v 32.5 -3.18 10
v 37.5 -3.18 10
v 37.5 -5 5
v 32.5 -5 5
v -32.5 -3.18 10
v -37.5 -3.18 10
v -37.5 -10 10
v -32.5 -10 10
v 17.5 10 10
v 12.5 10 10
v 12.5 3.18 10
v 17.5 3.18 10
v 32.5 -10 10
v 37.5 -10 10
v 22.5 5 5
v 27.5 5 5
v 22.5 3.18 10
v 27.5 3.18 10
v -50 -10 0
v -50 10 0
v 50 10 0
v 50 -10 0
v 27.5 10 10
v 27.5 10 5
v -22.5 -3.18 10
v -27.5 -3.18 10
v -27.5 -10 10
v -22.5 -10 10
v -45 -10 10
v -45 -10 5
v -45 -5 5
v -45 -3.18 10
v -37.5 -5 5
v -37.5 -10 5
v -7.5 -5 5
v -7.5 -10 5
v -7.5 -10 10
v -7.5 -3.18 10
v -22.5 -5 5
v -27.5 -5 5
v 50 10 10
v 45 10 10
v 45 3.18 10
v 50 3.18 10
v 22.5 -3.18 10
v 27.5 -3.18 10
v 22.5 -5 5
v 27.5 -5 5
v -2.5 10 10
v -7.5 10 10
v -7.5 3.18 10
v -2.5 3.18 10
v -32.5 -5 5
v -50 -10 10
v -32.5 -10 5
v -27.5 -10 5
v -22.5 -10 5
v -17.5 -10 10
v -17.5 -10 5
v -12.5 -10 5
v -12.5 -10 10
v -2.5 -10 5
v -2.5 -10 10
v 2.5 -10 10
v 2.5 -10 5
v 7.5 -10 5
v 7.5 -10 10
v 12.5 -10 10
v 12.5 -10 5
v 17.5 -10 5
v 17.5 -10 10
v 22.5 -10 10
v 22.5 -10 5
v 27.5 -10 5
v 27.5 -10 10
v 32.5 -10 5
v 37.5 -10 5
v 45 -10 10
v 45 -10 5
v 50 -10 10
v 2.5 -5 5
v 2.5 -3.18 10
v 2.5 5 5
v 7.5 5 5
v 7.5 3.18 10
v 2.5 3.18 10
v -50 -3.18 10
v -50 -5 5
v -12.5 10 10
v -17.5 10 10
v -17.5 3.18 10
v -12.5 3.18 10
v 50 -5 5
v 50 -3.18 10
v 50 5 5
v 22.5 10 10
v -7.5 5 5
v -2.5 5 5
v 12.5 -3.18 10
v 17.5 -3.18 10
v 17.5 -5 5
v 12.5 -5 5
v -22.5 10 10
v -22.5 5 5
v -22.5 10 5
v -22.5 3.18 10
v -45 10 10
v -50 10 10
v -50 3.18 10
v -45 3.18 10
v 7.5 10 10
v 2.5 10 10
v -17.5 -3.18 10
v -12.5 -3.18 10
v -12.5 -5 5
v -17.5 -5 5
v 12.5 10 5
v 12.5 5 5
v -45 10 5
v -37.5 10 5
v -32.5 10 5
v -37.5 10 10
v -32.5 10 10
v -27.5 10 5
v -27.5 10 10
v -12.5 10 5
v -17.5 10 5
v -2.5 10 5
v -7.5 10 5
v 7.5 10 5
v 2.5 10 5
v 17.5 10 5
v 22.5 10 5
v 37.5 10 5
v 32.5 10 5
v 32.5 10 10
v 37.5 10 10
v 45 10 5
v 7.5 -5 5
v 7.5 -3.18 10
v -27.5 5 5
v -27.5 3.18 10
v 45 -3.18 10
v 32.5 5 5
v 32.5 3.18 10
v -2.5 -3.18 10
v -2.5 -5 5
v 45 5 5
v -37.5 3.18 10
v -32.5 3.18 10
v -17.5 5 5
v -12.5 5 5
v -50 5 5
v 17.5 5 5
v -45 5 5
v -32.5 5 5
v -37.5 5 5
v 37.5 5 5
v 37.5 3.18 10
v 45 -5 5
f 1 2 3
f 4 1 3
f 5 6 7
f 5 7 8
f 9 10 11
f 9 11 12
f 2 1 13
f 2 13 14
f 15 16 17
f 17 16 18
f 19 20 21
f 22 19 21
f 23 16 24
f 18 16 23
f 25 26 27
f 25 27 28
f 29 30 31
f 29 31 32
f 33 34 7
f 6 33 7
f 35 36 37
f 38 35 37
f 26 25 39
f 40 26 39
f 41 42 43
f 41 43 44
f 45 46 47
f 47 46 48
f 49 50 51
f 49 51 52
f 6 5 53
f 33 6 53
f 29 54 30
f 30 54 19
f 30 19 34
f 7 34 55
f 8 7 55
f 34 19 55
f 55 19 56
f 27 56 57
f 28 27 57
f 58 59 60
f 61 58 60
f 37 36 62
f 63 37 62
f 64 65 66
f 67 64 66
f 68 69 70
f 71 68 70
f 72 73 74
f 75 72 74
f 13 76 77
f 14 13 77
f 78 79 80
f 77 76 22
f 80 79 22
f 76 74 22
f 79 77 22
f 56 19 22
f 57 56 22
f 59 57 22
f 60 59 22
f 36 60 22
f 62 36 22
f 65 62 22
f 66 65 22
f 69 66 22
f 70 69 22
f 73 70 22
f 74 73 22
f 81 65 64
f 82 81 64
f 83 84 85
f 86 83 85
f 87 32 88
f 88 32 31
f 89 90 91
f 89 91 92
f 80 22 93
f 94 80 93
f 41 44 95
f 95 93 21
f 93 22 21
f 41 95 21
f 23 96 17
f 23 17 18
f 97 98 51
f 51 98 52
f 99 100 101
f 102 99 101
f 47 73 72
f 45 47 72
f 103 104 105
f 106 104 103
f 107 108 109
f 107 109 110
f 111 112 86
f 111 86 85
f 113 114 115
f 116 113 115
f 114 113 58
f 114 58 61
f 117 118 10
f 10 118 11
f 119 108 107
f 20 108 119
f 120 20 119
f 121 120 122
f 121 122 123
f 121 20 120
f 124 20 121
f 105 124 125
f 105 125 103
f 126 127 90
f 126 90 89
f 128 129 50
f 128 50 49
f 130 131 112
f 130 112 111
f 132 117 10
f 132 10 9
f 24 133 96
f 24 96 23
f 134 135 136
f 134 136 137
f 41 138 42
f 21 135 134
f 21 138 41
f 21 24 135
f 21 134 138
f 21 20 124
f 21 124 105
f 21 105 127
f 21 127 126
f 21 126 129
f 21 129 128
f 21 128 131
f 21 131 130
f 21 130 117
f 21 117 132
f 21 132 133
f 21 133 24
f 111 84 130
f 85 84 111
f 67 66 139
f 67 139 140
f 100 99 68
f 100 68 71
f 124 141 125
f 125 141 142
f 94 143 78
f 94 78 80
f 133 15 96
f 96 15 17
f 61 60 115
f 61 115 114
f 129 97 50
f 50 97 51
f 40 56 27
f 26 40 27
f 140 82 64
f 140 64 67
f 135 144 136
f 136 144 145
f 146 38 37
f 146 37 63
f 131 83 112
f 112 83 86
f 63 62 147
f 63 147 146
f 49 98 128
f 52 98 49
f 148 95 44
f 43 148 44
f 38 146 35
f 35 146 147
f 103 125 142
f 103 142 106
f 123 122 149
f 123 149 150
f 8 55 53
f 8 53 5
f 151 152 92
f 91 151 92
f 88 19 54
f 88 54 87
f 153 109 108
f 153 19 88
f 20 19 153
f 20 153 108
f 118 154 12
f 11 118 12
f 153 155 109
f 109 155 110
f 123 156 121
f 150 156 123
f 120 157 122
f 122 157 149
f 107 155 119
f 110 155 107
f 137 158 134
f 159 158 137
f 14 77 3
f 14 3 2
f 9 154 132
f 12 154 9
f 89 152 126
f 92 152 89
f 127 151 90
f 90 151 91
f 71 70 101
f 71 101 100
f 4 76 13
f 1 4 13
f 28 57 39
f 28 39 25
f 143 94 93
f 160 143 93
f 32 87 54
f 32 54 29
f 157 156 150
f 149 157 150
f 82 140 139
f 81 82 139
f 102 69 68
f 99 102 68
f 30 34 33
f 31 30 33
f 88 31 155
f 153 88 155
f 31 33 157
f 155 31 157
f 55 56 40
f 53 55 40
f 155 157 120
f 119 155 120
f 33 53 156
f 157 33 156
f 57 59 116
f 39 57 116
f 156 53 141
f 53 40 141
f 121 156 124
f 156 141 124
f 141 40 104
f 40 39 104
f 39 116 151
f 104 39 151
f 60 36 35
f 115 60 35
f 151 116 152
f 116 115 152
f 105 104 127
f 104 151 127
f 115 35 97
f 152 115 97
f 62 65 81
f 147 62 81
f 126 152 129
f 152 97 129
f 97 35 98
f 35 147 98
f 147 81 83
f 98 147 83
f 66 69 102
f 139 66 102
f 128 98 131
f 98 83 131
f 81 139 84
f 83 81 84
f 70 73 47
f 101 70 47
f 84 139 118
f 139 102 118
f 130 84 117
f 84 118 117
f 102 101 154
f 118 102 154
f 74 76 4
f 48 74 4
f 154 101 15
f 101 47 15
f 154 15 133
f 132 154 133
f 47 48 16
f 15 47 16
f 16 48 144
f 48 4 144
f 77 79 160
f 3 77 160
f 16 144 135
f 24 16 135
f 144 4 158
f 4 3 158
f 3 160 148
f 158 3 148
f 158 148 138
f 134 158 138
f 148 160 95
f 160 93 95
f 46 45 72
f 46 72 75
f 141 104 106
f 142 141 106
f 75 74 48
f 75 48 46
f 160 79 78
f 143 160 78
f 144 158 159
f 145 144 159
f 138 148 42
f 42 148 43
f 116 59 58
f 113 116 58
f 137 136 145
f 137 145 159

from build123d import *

# Parameters (mm, degrees)
F0_W     = 100
F0_H     = 20
F1_DEPTH = 10
F3_DEPTH = 100.001
F4_W     = 7.5
F4_H     = 5
F4_W_2   = 5
F5_DEPTH = 20.001


with BuildPart() as f1:
    # F0 (on Top) → F1 (new body)
    with BuildSketch(Plane.XY):
        Rectangle(F0_W, F0_H)
    extrude(amount=F1_DEPTH)

    # F2 (on face) → F3 (cut, through all)
    with BuildSketch(Plane.YZ.offset(50)):
        Polygon((3.180149, 10), (-3.180149, 10), (-5, 5), (5, 5), align=None)
    extrude(amount=-F3_DEPTH, mode=Mode.SUBTRACT)

    # F4 (on face) → F5 (cut, through all)
    with BuildSketch(Plane.XZ.offset(10)):
        with Locations((-41.25, 7.5)):
            Rectangle(F4_W, F4_H)
        with Locations((-30, 7.5)):
            Rectangle(F4_W_2, F4_H)
        with Locations((-20, 7.5)):
            Rectangle(F4_W_2, F4_H)
        with Locations((-10, 7.5)):
            Rectangle(F4_W_2, F4_H)
        with Locations((0, 7.5)):
            Rectangle(F4_W_2, F4_H)
        with Locations((10, 7.5)):
            Rectangle(F4_W_2, F4_H)
        with Locations((20, 7.5)):
            Rectangle(F4_W_2, F4_H)
        with Locations((30, 7.5)):
            Rectangle(F4_W_2, F4_H)
        with Locations((41.25, 7.5)):
            Rectangle(F4_W, F4_H)
    extrude(amount=-F5_DEPTH, mode=Mode.SUBTRACT)


solid = f1.part
